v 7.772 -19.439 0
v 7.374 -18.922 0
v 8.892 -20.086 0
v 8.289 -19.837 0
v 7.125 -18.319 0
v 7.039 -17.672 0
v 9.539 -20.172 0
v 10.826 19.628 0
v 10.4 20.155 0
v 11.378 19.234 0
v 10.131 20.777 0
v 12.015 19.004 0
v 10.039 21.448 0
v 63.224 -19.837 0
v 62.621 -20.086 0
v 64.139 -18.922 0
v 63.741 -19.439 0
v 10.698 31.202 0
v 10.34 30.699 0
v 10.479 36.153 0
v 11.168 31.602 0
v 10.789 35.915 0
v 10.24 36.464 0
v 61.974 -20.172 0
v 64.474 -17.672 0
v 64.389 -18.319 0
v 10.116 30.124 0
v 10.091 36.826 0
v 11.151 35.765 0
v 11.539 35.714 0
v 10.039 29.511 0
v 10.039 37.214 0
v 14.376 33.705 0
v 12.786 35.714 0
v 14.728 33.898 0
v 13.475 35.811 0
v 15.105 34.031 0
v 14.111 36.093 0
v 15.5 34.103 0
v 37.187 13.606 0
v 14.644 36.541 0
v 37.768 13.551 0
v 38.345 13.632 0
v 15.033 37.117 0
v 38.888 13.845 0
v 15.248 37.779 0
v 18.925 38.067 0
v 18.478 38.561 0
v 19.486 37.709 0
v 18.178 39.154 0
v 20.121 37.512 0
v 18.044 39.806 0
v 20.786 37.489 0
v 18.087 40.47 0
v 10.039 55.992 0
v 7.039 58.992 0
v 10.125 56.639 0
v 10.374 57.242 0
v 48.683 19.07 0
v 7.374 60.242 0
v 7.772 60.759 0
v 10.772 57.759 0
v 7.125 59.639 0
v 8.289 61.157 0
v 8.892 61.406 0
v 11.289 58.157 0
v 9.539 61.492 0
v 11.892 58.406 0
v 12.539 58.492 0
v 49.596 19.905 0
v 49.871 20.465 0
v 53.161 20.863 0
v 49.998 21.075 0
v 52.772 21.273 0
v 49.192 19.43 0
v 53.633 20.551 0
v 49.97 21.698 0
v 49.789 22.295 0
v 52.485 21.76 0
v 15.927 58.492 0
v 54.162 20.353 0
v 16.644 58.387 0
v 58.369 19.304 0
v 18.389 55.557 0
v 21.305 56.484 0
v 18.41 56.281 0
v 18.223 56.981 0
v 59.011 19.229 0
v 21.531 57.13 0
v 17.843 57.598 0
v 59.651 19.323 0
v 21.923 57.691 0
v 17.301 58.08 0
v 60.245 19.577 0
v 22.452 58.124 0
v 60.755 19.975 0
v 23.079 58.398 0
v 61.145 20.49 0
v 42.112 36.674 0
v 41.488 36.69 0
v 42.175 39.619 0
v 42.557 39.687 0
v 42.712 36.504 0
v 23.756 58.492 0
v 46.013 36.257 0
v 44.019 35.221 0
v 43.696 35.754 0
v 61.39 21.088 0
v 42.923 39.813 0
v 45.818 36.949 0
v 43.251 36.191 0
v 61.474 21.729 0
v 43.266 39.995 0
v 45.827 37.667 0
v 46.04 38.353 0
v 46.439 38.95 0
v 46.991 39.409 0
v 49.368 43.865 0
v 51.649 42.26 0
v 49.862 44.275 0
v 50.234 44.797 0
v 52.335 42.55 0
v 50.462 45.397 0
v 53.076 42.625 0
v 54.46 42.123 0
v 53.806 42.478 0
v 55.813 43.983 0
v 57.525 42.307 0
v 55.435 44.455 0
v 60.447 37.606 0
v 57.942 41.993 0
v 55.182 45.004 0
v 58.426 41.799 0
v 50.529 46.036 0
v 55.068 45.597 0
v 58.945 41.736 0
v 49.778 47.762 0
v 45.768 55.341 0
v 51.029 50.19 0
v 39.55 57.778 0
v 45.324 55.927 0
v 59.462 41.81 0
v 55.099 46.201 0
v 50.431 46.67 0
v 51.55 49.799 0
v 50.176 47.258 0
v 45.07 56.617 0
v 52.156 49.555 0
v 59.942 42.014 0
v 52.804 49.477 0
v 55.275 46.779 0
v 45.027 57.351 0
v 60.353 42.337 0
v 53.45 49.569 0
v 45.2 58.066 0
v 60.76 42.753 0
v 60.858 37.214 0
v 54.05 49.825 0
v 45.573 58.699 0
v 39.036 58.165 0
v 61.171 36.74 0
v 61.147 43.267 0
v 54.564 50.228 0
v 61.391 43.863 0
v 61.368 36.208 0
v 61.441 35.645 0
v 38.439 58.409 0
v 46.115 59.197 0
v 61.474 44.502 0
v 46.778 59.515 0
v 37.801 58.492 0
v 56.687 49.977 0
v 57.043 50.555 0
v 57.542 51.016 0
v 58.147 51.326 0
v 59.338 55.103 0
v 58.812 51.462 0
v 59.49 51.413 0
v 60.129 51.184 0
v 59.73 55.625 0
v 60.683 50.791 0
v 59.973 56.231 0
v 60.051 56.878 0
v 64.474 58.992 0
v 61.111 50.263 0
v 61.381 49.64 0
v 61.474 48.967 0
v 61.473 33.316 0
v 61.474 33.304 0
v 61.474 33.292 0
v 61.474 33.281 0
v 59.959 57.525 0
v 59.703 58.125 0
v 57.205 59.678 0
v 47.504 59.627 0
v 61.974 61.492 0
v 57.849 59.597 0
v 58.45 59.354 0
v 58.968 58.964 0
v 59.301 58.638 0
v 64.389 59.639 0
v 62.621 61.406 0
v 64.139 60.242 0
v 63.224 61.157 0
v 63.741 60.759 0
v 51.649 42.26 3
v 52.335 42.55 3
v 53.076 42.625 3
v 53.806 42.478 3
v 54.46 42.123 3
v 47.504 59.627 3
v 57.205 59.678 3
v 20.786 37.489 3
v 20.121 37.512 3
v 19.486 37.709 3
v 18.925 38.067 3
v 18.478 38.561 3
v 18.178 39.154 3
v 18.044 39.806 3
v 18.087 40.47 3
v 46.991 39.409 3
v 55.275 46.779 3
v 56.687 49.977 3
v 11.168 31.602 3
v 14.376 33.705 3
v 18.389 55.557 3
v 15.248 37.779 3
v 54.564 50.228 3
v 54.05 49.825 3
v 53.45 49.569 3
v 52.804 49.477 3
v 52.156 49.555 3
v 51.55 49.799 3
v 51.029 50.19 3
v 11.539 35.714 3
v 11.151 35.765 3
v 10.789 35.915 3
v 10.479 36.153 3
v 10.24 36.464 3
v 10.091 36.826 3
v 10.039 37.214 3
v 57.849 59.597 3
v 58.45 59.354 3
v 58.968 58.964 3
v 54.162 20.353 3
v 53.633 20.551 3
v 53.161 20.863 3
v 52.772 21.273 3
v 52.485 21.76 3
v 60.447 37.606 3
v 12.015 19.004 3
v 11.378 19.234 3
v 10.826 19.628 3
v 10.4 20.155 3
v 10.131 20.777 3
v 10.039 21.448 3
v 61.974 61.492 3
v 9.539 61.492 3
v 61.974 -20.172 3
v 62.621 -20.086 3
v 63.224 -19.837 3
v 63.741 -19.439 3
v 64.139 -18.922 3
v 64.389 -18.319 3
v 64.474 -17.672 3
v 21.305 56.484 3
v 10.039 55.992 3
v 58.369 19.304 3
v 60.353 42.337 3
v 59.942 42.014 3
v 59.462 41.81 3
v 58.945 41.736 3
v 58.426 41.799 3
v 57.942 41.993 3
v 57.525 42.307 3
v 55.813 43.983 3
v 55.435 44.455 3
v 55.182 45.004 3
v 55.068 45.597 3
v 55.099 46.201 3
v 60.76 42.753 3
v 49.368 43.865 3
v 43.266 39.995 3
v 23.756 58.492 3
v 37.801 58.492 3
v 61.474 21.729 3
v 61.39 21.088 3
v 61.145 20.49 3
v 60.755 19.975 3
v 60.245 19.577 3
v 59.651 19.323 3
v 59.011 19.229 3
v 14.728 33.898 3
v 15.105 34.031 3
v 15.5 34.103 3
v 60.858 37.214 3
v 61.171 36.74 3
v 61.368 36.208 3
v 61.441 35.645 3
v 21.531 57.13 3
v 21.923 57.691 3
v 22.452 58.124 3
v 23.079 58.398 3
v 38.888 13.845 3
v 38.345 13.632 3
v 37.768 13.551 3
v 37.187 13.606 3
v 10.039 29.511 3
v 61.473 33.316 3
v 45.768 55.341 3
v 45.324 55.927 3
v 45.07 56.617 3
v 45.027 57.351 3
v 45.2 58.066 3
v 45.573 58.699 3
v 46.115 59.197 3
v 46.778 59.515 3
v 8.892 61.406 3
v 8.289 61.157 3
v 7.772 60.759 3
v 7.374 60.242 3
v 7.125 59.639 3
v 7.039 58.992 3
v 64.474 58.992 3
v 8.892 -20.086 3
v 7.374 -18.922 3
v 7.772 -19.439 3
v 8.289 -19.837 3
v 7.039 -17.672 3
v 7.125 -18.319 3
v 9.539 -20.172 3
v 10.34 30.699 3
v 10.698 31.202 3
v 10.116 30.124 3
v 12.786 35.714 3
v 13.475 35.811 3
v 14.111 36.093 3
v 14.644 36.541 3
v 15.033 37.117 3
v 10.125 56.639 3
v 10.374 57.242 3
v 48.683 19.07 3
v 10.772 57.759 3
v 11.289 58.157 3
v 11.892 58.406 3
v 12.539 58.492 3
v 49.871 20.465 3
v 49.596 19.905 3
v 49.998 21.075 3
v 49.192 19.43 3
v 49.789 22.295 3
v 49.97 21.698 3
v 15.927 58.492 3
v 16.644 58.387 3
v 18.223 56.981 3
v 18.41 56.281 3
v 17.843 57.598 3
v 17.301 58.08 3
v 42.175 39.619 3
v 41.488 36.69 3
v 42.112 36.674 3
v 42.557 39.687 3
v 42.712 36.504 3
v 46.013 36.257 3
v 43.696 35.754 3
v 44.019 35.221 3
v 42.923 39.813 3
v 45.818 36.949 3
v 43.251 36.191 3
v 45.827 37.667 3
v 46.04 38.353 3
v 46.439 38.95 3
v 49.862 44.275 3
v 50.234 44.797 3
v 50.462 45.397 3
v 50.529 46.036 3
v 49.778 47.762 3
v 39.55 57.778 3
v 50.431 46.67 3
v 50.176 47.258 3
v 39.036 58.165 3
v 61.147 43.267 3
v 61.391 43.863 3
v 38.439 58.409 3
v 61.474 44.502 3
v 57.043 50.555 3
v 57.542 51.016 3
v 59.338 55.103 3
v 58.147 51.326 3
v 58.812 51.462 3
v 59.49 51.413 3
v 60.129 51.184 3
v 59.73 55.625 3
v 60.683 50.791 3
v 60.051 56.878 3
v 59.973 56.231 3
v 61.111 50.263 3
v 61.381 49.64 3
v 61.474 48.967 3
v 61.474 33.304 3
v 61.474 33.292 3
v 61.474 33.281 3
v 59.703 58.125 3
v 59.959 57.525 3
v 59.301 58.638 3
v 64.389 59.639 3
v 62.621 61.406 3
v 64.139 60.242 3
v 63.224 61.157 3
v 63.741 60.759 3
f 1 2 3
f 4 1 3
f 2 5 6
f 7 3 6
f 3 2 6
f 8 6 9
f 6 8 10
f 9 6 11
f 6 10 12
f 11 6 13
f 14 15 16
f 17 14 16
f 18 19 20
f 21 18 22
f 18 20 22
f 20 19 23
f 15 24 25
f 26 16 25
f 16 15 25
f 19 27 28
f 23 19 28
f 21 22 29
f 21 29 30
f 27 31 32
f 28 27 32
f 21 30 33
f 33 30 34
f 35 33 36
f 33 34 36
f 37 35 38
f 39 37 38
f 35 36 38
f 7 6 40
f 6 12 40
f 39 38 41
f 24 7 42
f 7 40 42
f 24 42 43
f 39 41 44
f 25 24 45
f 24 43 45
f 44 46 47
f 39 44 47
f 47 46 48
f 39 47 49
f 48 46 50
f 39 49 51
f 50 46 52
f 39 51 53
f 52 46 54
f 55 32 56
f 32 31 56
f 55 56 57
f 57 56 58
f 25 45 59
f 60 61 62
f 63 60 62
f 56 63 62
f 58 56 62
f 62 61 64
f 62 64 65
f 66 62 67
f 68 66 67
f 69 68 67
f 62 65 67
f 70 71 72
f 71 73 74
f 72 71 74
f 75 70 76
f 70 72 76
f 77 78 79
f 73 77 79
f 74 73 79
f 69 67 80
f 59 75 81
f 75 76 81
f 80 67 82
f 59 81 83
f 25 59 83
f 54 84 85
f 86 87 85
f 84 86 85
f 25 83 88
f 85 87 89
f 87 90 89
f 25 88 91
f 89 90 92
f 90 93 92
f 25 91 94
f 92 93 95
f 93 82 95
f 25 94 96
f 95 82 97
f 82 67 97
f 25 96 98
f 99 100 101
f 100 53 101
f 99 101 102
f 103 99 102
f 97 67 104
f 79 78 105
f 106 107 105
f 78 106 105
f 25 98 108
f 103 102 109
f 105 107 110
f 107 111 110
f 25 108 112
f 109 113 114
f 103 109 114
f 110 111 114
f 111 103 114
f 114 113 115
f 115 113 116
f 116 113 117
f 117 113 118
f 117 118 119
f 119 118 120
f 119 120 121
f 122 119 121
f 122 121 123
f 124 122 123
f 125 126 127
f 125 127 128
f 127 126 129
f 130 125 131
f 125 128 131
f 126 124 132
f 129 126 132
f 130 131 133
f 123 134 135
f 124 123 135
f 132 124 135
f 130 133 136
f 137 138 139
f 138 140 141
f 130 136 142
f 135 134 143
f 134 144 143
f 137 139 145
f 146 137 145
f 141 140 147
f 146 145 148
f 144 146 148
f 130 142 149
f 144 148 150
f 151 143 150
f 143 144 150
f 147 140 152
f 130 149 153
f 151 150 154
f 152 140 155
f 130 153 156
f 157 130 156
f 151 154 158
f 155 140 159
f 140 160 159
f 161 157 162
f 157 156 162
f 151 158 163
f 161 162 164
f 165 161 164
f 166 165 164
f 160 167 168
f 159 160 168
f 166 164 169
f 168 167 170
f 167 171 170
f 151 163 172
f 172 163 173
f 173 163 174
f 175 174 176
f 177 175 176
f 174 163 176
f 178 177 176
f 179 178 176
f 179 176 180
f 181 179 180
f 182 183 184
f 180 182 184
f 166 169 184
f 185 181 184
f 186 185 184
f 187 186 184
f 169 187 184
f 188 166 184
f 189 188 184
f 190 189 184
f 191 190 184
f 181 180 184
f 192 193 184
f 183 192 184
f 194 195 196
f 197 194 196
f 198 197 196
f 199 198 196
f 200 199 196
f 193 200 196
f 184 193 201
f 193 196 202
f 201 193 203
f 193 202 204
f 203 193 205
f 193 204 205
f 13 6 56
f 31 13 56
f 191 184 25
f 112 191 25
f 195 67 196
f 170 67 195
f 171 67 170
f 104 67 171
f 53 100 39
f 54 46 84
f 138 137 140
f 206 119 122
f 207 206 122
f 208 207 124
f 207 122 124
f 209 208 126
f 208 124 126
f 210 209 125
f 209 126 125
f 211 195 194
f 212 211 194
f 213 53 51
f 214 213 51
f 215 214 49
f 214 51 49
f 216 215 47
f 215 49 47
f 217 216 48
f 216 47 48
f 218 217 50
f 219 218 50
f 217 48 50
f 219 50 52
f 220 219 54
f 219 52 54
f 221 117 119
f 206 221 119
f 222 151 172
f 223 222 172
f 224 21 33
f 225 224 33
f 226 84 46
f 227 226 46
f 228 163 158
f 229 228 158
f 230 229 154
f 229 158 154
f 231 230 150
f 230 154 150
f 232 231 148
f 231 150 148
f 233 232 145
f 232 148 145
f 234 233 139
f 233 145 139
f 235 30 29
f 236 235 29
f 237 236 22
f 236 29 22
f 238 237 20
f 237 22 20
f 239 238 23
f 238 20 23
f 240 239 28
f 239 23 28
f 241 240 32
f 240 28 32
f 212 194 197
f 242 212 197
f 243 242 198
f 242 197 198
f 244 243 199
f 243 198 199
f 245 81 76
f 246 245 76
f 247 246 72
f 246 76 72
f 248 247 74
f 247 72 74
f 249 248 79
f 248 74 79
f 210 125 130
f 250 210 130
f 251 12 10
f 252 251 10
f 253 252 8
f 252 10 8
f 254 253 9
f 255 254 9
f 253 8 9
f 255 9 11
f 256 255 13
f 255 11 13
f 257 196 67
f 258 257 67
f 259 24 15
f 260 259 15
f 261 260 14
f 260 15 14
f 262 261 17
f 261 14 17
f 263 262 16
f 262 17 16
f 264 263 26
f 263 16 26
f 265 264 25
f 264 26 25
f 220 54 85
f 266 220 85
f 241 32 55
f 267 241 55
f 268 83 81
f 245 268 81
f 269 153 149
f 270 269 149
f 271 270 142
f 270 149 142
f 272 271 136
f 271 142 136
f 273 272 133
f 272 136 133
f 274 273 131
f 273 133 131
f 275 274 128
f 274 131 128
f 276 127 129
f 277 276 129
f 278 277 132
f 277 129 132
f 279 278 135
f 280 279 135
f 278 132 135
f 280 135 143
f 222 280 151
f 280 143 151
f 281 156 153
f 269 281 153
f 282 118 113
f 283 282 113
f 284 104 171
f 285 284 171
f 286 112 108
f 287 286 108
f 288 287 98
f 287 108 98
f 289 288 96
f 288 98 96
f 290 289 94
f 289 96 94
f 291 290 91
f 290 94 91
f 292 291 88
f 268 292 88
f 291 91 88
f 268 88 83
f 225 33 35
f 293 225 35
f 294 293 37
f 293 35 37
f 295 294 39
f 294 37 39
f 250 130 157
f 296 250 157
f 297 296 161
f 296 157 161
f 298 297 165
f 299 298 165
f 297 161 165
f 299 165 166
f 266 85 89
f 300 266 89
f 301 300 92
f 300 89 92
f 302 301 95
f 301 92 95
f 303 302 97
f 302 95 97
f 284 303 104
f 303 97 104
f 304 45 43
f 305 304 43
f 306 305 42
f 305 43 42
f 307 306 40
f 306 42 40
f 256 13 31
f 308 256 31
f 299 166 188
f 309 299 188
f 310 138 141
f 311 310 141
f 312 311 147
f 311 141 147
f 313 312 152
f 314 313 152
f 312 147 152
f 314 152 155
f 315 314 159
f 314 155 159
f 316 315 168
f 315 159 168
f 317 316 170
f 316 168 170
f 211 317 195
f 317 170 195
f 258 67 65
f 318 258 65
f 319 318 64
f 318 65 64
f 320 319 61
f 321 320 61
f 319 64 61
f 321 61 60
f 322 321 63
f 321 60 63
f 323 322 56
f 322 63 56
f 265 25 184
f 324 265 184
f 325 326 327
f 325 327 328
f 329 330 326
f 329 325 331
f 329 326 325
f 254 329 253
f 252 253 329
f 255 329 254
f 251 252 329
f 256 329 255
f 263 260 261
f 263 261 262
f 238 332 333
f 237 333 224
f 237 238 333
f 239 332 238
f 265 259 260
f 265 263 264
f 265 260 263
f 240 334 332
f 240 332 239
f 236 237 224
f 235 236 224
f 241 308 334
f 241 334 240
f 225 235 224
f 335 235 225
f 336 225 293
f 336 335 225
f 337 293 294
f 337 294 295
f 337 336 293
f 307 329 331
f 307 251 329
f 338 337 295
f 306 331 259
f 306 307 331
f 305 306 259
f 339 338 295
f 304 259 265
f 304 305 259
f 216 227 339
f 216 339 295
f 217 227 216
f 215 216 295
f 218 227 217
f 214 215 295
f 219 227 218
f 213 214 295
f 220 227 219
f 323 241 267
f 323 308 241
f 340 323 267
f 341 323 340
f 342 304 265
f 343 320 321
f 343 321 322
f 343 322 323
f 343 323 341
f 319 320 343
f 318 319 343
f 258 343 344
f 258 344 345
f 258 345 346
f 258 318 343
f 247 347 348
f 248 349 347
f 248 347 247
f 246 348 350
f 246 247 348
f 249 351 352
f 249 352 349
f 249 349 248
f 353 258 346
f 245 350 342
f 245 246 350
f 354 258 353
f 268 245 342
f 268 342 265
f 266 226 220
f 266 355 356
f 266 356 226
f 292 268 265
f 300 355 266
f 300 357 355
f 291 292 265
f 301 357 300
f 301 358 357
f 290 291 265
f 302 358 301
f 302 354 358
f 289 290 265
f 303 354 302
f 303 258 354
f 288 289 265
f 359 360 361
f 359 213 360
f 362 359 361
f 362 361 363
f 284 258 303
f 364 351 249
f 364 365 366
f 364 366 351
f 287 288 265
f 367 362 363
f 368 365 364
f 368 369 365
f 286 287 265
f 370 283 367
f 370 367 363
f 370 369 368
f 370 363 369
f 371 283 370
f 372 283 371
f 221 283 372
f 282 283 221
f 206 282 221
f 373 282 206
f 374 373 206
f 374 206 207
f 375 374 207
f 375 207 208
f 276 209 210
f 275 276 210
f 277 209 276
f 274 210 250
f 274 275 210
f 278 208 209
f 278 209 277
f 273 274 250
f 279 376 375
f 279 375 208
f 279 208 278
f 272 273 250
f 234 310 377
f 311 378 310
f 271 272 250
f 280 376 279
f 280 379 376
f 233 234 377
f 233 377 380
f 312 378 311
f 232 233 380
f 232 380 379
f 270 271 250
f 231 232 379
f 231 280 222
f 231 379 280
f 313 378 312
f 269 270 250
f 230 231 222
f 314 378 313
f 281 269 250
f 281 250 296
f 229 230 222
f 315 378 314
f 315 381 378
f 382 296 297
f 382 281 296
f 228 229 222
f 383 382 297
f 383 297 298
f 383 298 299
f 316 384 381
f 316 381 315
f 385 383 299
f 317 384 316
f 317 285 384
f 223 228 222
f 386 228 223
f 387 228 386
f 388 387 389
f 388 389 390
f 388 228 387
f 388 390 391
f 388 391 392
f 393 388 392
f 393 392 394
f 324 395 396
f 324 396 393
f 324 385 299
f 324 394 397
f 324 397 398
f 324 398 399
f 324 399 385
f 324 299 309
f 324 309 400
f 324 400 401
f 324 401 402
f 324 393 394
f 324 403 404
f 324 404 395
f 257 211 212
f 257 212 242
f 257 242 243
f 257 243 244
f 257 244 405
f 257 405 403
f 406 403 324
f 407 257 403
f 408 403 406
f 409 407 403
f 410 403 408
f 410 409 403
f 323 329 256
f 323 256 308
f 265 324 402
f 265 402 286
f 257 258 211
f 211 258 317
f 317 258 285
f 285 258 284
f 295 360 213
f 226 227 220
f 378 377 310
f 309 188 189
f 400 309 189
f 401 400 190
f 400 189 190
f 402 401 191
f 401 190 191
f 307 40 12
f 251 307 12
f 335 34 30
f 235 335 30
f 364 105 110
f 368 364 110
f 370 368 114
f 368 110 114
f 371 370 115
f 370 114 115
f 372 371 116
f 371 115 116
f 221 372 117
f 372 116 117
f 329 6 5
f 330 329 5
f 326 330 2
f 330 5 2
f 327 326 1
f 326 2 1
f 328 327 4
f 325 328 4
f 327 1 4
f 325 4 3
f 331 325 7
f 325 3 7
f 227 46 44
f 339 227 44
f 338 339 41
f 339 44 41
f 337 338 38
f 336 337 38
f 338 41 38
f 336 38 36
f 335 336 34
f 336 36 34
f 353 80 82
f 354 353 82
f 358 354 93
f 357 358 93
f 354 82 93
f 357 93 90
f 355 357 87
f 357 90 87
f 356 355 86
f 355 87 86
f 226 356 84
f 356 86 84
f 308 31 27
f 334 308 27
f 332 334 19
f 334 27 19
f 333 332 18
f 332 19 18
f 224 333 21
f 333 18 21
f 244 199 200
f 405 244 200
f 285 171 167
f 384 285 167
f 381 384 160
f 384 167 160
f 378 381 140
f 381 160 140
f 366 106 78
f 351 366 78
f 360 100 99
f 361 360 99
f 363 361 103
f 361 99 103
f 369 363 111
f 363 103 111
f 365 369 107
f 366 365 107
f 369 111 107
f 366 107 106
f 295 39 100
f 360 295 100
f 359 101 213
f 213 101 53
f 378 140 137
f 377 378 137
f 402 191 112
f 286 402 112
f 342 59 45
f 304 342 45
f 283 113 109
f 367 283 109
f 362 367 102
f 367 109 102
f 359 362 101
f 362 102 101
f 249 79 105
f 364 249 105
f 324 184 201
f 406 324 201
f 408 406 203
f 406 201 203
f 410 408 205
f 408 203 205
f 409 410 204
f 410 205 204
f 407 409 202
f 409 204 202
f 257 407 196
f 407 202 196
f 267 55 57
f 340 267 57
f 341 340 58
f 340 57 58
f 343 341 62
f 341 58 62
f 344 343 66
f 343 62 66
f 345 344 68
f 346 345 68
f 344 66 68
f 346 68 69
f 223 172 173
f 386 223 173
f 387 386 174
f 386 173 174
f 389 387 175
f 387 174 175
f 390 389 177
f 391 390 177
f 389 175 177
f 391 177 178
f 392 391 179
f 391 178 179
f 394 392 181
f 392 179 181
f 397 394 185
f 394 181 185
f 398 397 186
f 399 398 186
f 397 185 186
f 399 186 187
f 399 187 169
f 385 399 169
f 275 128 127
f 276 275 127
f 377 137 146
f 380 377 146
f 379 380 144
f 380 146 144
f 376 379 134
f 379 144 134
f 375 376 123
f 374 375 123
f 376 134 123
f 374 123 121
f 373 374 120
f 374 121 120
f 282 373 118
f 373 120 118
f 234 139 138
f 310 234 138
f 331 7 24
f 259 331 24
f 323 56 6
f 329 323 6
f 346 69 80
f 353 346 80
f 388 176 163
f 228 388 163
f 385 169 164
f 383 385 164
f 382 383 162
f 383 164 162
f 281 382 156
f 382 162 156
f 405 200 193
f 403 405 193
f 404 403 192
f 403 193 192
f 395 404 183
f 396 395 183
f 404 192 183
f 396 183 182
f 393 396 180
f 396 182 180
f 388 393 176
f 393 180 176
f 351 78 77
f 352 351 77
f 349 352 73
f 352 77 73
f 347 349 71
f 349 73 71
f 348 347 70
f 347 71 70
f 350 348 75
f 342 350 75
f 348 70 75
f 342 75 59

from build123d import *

# Parameters (mm, degrees)
F2_DEPTH = 3
F3_ANGLE = -180


with BuildPart() as f2:
    # F1 (on Top) → F2 (new body)
    with BuildSketch(Plane.XY):
        with BuildLine():
            ThreePointArc((9.5394564345, 61.4916072786), (7.7716894816, 60.7593742316), (7.0394564345, 58.9916072786))
            Line((7.0394564345, 58.9916072786), (7.0394564345, -17.6715264808))
            ThreePointArc((7.0394564345, -17.6715264808), (7.7716894816, -19.4392934337), (9.5394564345, -20.1715264808))
            Line((9.5394564345, -20.1715264808), (61.973710984, -20.1715264808))
            ThreePointArc((61.973710984, -20.1715264808), (63.741477937, -19.4392934337), (64.473710984, -17.6715264808))
            Line((64.473710984, -17.6715264808), (64.473710984, 58.9916072786))
            ThreePointArc((64.473710984, 58.9916072786), (63.741477937, 60.7593742316), (61.973710984, 61.4916072786))
            Line((61.973710984, 61.4916072786), (9.5394564345, 61.4916072786))
        make_face()
        with BuildLine():
            ThreePointArc((10.0394564345, 29.5111155982), (10.339726047, 30.6990491915), (11.1684054122, 31.6016224971))
            Line((11.1684054122, 31.6016224971), (14.3762351945, 33.7054654956))
            ThreePointArc((14.3762351945, 33.7054654956), (14.9139294436, 33.9719729133), (15.4996438847, 34.1026630155))
            Line((15.4996438847, 34.1026630155), (41.488379603, 36.6897513669))
            ThreePointArc((41.488379603, 36.6897513669), (42.9909448679, 36.3642607287), (44.0189190549, 35.2210566343))
            Line((44.0189190549, 35.2210566343), (49.7887253608, 22.2949045332))
            ThreePointArc((49.7887253608, 22.2949045332), (49.8705715629, 20.4647296223), (48.6825547612, 19.0701490101))
            Line((48.6825547612, 19.0701490101), (38.8881494106, 13.8450064155))
            ThreePointArc((38.8881494106, 13.8450064155), (38.0588591774, 13.5750123576), (37.187286277, 13.6063135007))
            Line((37.187286277, 13.6063135007), (12.0153198212, 19.0036871275))
            ThreePointArc((12.0153198212, 19.0036871275), (10.5951903091, 19.8765568437), (10.0394564345, 21.4481258791))
            Line((10.0394564345, 21.4481258791), (10.0394564345, 29.5111155982))
        make_face(mode=Mode.SUBTRACT)
        with BuildLine():
            ThreePointArc((15.9272251247, 58.4916072786), (17.8426196837, 57.5982384383), (18.38909119, 55.5566182253))
            Line((18.38909119, 55.5566182253), (15.2479060665, 37.7787523161))
            ThreePointArc((15.2479060665, 37.7787523161), (14.3926711609, 36.2983468103), (12.7860400011, 35.7137413693))
            Line((12.7860400011, 35.7137413693), (11.5394564345, 35.7137413693))
            ThreePointArc((11.5394564345, 35.7137413693), (10.4787962628, 36.1530811975), (10.0394564345, 37.2137413693))
            Line((10.0394564345, 37.2137413693), (10.0394564345, 55.9916072786))
            ThreePointArc((10.0394564345, 55.9916072786), (10.7716894816, 57.7593742316), (12.5394564345, 58.4916072786))
            Line((12.5394564345, 58.4916072786), (15.9272251247, 58.4916072786))
        make_face(mode=Mode.SUBTRACT)
        with BuildLine():
            Line((42.1746714548, 39.6185510587), (20.7860221636, 37.4893853296))
            ThreePointArc((20.7860221636, 37.4893853296), (18.6852371117, 38.299036692), (18.0873754635, 40.4696114113))
            Line((18.0873754635, 40.4696114113), (21.3054426802, 56.4841289415))
            ThreePointArc((21.3054426802, 56.4841289415), (22.1723549039, 57.9256838227), (23.7564470481, 58.4916072786))
            Line((23.7564470481, 58.4916072786), (37.8007872021, 58.4916072786))
            ThreePointArc((37.8007872021, 58.4916072786), (38.7453269087, 58.3063091477), (39.5498494615, 57.7778830727))
            Line((39.5498494615, 57.7778830727), (49.7784843846, 47.7623415937))
            ThreePointArc((49.7784843846, 47.7623415937), (50.5156898059, 45.7143923011), (49.3682772196, 43.8647943731))
            Line((49.3682772196, 43.8647943731), (43.265884217, 39.994984051))
            ThreePointArc((43.265884217, 39.994984051), (42.7423014517, 39.7429249823), (42.1746714548, 39.6185510587))
        make_face(mode=Mode.SUBTRACT)
        with BuildLine():
            ThreePointArc((46.0133442347, 36.2574461736), (45.9085359015, 38.0173085241), (46.991124046, 39.4087477749))
            Line((46.991124046, 39.4087477749), (51.6493053984, 42.2598926234))
            ThreePointArc((51.6493053984, 42.2598926234), (53.0758807488, 42.6246485541), (54.4603215443, 42.1231629578))
            Line((54.4603215443, 42.1231629578), (60.4469597614, 37.6055030683))
            ThreePointArc((60.4469597614, 37.6055030683), (61.1709104619, 36.7403261682), (61.4408153873, 35.6449782708))
            Line((61.4408153873, 35.6449782708), (61.4734654473, 33.3155527949))
            ThreePointArc((61.4734654473, 33.3155527949), (61.4736495991, 33.2980344991), (61.473710984, 33.2805153429))
            Line((61.473710984, 33.2805153429), (61.473710984, 21.7292172013))
            ThreePointArc((61.473710984, 21.7292172013), (60.5127092735, 19.7590689163), (58.3685235721, 19.3035733287))
            Line((58.3685235721, 19.3035733287), (54.162405597, 20.35298115))
            ThreePointArc((54.162405597, 20.35298115), (53.161382251, 20.8628779095), (52.4846958892, 21.7596153363))
            Line((52.4846958892, 21.7596153363), (46.0133442347, 36.2574461736))
        make_face(mode=Mode.SUBTRACT)
        with BuildLine():
            Line((57.524509199, 42.3068744408), (55.8126571334, 43.9830634434))
            ThreePointArc((55.8126571334, 43.9830634434), (55.1067308347, 45.2970774673), (55.2747666339, 46.7792140212))
            Line((55.2747666339, 46.7792140212), (56.6867582251, 49.9767966496))
            ThreePointArc((56.6867582251, 49.9767966496), (59.4897623878, 51.4130802722), (61.473710984, 48.9669218659))
            Line((61.473710984, 48.9669218659), (61.473710984, 44.5015785165))
            ThreePointArc((61.473710984, 44.5015785165), (61.2884128531, 43.5570388099), (60.7599867781, 42.7525162571))
            Line((60.7599867781, 42.7525162571), (60.3527796418, 42.3366452686))
            ThreePointArc((60.3527796418, 42.3366452686), (58.9448101607, 41.736005867), (57.524509199, 42.3068744408))
        make_face(mode=Mode.SUBTRACT)
        with BuildLine():
            Line((51.0285760641, 50.1903671406), (45.7683108872, 55.3410450625))
            ThreePointArc((45.7683108872, 55.3410450625), (45.2002064135, 58.0657974579), (47.504283237, 59.6272865873))
            Line((47.504283237, 59.6272865873), (57.2054807654, 59.6780824029))
            ThreePointArc((57.2054807654, 59.6780824029), (58.1570472763, 59.4952834054), (58.9676329344, 58.9643924665))
            Line((58.9676329344, 58.9643924665), (59.3005865812, 58.6383752525))
            ThreePointArc((59.3005865812, 58.6383752525), (60.0513858333, 56.8784134011), (59.337800116, 55.1030371989))
            Line((59.337800116, 55.1030371989), (54.5639141177, 50.2275806753))
            ThreePointArc((54.5639141177, 50.2275806753), (52.8039522663, 49.4767814233), (51.0285760641, 50.1903671406))
        make_face(mode=Mode.SUBTRACT)
    extrude(amount=F2_DEPTH)


with BuildPart() as f3_1:
    # F3: copy of F2
    add(f2.part.rotate(Axis((35.7565837093, -20.1715264808, 3), (1, 0, 0)), F3_ANGLE))


solid = f2.part
